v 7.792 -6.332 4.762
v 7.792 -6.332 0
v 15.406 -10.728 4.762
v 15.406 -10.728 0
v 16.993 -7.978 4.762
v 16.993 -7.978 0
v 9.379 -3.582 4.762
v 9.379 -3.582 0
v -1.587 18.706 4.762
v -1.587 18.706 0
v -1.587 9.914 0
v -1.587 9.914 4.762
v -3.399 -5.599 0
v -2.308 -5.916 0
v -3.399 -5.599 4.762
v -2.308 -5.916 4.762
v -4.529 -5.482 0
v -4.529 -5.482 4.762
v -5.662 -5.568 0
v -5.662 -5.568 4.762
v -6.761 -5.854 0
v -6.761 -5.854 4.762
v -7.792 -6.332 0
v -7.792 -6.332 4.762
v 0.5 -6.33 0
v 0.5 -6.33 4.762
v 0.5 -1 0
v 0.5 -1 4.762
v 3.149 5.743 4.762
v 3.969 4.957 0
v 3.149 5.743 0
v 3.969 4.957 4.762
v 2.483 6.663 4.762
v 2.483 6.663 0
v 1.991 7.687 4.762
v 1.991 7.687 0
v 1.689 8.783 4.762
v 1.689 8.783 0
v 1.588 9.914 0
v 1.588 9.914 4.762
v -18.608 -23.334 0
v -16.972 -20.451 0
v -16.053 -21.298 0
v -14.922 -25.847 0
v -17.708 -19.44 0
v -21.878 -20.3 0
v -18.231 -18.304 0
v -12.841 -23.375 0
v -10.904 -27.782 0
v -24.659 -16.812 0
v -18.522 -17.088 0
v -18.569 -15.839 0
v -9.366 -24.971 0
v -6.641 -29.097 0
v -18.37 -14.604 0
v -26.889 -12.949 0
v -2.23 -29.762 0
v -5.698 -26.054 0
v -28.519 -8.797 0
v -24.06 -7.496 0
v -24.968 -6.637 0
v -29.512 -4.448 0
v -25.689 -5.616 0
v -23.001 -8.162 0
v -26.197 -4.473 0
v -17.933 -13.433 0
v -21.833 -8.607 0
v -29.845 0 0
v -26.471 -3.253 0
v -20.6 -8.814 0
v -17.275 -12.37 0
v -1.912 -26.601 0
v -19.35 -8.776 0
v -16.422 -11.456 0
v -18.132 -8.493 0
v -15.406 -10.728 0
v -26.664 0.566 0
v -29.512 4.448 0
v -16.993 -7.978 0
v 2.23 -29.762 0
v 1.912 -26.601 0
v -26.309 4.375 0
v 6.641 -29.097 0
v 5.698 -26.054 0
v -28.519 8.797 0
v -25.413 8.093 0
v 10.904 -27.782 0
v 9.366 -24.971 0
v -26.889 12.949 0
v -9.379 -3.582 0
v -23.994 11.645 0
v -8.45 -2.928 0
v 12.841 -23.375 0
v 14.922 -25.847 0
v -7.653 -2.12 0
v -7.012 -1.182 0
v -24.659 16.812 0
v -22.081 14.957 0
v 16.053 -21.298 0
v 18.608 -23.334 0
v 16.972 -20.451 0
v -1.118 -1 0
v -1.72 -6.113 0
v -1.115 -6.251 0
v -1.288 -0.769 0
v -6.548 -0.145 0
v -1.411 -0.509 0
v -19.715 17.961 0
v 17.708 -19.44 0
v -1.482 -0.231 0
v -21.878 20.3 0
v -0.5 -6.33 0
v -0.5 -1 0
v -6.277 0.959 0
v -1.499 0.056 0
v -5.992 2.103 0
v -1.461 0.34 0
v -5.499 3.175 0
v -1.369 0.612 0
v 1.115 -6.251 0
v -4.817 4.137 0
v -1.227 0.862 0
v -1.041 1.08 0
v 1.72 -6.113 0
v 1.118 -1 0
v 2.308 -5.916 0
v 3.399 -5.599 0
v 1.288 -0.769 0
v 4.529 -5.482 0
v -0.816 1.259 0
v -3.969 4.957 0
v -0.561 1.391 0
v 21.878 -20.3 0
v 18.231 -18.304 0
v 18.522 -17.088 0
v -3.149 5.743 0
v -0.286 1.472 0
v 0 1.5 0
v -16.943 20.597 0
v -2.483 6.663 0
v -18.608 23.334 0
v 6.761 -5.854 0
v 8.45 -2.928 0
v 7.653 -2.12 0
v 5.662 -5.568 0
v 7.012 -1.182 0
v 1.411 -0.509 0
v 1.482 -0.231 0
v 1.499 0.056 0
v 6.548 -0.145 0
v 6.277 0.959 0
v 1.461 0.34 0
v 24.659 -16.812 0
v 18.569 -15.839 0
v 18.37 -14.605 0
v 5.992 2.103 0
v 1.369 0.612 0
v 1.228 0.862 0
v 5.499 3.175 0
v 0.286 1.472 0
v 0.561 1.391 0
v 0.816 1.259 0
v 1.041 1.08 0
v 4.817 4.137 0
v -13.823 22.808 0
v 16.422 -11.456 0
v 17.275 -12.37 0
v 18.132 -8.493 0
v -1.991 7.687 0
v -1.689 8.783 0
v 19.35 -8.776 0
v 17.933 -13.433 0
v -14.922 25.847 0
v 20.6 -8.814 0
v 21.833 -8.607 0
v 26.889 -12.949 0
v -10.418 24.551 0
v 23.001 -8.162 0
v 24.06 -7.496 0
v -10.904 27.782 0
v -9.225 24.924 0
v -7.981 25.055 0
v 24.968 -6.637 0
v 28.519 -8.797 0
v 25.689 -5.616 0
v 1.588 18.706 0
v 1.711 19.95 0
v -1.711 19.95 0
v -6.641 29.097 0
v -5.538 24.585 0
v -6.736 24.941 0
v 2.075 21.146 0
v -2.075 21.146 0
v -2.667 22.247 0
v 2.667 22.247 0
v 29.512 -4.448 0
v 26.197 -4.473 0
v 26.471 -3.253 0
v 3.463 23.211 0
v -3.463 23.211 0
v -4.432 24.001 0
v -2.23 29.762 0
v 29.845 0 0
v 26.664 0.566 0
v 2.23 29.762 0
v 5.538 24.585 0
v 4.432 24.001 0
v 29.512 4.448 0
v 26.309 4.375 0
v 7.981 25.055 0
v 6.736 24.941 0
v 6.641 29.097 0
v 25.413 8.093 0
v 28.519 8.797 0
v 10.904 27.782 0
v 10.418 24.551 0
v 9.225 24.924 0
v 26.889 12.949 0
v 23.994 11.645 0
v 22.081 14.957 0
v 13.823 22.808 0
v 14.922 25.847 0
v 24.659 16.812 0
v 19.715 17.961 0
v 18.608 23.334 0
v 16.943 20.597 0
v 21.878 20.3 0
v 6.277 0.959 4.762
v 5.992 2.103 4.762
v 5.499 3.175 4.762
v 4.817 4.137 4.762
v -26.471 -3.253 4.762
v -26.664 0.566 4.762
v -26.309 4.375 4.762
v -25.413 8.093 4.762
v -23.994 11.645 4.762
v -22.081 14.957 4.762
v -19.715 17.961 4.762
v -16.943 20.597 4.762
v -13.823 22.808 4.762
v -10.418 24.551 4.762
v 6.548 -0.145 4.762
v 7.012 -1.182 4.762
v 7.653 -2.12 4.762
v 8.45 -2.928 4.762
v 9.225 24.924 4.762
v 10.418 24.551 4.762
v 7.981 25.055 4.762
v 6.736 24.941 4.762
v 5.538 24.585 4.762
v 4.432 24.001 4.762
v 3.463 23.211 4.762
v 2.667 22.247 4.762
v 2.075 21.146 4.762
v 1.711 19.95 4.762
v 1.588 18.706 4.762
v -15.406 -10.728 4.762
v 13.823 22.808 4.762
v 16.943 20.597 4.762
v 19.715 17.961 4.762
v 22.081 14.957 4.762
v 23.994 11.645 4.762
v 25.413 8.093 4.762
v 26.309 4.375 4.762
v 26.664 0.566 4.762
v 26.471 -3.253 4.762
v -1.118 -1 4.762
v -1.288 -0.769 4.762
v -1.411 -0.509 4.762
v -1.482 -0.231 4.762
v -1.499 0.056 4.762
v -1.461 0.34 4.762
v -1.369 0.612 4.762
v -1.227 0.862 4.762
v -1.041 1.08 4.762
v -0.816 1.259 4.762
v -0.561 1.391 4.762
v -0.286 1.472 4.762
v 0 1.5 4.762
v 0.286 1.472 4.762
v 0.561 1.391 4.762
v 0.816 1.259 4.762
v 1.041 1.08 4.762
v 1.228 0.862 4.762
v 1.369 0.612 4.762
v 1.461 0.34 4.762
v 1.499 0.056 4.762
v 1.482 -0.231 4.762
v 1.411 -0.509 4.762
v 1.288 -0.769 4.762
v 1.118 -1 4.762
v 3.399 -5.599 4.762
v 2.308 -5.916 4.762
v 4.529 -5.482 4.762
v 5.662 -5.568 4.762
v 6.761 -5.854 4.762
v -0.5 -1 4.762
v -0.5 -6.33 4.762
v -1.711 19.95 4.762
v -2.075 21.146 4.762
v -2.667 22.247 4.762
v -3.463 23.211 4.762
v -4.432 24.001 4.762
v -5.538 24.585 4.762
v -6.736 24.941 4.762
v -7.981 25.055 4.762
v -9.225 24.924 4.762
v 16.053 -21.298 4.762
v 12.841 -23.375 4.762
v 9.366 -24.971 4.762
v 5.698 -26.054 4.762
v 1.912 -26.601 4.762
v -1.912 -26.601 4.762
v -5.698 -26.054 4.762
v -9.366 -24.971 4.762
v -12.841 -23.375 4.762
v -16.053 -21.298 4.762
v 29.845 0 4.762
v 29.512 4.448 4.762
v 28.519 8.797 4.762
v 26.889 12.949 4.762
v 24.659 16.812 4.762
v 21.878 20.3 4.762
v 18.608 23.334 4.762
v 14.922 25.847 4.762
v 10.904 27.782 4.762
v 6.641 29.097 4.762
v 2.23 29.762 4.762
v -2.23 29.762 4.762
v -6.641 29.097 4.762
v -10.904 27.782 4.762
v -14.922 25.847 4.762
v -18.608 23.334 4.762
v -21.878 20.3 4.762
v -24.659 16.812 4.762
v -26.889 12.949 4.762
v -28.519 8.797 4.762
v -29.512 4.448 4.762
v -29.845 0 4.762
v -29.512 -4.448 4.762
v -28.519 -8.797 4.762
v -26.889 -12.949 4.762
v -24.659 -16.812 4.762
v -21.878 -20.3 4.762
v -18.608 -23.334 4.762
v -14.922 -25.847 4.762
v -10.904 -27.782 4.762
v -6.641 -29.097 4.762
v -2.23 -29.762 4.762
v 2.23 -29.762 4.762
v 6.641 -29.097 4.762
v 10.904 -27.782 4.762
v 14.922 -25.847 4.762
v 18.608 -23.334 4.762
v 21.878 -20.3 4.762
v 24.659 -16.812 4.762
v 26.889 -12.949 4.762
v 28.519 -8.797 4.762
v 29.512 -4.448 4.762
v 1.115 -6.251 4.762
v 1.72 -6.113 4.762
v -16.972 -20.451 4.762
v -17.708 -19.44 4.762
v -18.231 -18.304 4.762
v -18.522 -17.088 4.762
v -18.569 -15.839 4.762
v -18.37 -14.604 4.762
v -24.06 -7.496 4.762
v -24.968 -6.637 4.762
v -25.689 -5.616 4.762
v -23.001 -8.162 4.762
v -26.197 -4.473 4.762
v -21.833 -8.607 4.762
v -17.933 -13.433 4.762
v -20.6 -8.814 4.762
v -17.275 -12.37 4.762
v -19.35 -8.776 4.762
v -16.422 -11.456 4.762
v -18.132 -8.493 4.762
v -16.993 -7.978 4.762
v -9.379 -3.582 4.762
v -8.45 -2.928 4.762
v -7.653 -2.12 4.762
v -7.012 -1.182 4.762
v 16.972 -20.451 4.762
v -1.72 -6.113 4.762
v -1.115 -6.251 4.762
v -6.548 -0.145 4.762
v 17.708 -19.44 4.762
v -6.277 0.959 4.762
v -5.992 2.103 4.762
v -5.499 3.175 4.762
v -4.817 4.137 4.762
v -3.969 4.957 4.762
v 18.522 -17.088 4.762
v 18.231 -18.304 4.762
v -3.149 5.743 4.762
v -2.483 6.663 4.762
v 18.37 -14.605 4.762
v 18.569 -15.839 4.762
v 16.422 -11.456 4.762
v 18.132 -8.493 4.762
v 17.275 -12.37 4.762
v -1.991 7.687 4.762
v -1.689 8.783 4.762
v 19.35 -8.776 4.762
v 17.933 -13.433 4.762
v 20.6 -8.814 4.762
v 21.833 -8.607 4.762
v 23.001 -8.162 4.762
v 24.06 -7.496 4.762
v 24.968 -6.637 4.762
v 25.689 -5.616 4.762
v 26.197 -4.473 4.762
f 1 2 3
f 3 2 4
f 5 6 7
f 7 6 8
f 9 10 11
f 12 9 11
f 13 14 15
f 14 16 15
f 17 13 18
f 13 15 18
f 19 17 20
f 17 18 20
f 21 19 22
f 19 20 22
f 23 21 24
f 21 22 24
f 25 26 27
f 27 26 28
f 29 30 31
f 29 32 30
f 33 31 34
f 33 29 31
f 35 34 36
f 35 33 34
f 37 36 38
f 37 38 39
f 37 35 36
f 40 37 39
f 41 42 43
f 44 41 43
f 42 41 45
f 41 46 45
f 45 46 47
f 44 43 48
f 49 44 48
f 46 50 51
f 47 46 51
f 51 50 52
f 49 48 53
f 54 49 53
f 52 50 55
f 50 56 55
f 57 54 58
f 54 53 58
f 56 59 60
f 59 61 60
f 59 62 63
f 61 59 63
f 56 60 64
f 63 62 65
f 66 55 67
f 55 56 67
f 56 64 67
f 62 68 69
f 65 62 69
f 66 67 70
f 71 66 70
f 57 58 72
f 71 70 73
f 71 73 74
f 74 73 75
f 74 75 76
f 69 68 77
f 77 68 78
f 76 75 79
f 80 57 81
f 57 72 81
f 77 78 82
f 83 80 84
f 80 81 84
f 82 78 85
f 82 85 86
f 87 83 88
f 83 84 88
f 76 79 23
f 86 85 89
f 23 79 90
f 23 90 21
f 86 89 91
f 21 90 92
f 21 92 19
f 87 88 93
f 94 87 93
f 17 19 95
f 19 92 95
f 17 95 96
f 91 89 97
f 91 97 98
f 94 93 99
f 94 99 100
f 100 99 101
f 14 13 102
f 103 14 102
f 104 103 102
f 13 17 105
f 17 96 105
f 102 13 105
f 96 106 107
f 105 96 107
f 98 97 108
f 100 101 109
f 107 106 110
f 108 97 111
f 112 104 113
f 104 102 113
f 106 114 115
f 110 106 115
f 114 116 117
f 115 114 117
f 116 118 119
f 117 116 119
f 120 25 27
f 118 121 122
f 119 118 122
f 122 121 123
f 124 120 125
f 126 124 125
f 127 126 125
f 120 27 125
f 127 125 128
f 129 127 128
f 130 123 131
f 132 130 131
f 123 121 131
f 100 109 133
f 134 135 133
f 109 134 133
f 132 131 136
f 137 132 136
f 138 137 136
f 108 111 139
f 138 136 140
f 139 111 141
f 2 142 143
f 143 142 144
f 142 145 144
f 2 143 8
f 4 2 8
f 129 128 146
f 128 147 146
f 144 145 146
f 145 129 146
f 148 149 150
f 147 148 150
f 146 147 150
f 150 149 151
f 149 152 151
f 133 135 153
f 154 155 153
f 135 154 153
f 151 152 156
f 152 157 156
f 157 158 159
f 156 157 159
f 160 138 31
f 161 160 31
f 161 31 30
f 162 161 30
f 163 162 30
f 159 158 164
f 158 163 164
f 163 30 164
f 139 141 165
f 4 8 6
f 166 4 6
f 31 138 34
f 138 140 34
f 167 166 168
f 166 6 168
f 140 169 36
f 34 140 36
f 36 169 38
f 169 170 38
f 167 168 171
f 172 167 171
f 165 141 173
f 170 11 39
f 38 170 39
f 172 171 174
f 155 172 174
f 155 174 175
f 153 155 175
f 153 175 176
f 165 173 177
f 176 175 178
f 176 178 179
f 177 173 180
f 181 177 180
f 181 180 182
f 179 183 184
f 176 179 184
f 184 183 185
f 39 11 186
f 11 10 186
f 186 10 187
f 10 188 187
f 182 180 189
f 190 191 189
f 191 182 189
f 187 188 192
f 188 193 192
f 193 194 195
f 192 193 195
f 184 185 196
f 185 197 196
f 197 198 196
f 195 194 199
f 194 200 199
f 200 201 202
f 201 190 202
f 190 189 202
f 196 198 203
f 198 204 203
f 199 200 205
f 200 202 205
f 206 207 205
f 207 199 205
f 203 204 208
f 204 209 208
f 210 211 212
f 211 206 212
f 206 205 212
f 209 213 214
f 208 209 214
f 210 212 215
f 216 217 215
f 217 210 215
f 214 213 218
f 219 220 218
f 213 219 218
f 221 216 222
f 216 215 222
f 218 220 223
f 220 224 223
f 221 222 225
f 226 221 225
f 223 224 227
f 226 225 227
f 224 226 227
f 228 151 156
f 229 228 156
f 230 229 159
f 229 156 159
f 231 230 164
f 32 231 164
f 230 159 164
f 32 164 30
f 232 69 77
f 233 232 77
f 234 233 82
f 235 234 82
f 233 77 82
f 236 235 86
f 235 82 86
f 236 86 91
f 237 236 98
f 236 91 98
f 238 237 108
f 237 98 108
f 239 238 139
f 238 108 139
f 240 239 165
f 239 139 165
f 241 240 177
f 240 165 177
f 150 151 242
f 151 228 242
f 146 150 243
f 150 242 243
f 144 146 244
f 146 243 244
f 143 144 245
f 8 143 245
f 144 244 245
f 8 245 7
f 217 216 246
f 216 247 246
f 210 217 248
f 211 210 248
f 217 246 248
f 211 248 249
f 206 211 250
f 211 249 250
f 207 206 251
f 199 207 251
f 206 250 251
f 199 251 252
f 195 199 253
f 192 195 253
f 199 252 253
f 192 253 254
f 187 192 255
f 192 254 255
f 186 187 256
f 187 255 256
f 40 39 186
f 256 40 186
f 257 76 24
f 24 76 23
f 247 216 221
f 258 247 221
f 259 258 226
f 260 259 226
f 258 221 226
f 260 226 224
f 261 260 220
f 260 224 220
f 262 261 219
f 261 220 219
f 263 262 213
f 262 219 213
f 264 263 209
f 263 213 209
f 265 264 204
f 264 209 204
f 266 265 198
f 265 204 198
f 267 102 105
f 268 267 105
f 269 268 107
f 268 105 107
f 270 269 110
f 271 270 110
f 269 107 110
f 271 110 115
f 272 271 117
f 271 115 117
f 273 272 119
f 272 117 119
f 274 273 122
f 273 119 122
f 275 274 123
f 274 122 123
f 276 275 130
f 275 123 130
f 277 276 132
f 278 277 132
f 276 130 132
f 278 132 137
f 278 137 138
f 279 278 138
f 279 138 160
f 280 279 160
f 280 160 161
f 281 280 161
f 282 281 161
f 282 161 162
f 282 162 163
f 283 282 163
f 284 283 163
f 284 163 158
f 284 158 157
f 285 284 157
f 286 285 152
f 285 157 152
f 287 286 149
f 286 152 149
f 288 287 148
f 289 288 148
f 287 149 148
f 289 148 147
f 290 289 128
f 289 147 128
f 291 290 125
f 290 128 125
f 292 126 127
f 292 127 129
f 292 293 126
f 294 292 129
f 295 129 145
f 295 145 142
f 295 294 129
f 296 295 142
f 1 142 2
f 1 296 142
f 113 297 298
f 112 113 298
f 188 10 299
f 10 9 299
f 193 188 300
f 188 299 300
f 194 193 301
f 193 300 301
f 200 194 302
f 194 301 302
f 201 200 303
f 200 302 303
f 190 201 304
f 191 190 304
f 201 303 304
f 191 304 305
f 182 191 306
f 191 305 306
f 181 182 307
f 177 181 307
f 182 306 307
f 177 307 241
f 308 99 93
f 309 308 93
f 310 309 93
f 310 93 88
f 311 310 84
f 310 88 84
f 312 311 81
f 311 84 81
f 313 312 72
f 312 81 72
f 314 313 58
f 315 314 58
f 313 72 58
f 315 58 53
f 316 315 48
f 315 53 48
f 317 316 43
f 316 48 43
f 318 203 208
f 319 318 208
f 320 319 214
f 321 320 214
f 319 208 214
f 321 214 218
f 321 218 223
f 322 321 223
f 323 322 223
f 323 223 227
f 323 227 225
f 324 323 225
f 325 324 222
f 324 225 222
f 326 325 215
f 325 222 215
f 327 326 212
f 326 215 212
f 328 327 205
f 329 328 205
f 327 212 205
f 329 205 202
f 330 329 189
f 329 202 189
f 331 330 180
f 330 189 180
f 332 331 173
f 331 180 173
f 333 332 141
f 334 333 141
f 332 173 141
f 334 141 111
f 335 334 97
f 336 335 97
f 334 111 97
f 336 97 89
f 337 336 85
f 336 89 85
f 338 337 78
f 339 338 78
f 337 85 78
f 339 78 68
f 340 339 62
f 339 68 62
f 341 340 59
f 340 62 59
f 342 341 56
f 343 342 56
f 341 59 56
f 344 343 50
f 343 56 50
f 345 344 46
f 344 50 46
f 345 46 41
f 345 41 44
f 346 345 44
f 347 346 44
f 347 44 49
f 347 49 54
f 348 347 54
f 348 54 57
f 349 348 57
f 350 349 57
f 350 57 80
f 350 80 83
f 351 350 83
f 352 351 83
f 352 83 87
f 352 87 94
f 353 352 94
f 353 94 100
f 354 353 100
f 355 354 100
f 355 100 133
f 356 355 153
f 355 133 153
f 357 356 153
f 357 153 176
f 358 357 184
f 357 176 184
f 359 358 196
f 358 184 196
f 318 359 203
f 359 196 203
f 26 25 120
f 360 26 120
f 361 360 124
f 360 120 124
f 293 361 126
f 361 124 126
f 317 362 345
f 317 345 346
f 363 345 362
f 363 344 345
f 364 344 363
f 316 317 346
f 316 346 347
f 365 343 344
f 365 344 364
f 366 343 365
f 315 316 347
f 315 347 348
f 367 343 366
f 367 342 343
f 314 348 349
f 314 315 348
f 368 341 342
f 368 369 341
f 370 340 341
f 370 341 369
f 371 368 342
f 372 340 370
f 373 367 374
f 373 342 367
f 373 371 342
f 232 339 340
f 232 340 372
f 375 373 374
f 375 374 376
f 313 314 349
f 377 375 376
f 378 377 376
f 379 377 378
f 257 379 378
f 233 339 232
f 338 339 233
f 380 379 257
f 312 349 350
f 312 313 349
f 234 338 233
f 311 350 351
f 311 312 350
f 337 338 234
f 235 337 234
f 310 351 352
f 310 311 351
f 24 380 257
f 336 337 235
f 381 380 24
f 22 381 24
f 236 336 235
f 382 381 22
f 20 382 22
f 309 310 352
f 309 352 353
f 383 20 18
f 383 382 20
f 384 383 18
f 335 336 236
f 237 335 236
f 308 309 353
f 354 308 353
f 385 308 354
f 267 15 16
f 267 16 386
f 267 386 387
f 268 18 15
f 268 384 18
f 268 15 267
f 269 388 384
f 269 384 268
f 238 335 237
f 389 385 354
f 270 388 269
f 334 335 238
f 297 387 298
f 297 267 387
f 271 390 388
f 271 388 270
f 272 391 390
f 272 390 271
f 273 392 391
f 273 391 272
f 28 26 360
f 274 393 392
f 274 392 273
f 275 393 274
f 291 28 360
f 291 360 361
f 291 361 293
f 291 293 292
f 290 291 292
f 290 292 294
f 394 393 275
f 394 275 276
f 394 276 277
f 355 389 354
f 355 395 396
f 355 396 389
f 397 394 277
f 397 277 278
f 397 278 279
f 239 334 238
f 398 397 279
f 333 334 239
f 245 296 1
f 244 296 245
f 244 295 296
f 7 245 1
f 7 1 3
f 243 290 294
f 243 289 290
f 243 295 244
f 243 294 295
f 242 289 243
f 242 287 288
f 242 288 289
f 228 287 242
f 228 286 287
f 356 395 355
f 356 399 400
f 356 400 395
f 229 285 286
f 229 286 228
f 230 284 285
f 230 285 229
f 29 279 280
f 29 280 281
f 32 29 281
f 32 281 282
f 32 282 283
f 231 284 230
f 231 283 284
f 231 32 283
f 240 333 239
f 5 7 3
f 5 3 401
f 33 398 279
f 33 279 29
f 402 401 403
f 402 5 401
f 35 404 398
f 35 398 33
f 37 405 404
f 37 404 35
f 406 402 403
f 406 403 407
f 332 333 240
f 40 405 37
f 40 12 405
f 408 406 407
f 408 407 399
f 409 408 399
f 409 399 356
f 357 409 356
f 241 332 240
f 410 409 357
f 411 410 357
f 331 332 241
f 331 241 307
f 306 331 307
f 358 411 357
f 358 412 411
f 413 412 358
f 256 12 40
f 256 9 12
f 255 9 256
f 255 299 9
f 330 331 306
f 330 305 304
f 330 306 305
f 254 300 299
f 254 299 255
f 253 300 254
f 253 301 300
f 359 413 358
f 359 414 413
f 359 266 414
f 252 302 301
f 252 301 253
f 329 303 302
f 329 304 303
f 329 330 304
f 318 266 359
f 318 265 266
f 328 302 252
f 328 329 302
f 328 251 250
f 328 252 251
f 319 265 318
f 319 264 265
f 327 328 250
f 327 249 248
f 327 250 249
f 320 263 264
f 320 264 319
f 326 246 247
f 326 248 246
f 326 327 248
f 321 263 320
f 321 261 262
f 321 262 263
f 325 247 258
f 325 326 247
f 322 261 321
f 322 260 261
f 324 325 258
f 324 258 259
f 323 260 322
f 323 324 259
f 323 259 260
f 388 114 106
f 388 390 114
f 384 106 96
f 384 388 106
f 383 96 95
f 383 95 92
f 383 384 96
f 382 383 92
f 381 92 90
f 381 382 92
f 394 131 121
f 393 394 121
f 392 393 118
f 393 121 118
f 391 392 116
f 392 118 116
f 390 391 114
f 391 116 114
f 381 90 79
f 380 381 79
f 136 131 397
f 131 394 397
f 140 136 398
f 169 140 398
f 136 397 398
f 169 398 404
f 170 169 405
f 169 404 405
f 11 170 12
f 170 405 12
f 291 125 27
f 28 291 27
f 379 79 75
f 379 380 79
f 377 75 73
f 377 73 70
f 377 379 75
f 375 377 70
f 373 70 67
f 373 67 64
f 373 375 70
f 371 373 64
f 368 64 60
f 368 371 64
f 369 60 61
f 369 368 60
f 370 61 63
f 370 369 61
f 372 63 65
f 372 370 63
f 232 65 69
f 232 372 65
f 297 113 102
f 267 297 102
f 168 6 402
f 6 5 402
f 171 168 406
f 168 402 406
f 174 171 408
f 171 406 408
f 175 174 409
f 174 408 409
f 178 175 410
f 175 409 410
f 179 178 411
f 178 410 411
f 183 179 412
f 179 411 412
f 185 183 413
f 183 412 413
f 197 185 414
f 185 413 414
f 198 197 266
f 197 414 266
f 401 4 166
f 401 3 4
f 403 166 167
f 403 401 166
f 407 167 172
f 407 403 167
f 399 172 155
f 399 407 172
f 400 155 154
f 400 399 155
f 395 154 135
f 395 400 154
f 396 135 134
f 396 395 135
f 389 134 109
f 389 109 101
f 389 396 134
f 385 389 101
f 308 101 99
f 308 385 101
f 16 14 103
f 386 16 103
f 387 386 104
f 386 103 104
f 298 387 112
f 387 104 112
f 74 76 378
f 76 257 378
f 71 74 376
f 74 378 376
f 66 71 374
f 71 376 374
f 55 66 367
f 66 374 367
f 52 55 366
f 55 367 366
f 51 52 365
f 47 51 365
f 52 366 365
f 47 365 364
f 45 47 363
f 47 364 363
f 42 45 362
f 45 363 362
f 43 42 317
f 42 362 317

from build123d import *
from OCP.BRepAlgoAPI import BRepAlgoAPI_Cut
from OCP.TopTools import TopTools_ListOfShape

# Parameters (mm, degrees)
BOSS_EXTRUDE1_OUTLINE_R = 29.845
BOSS_EXTRUDE1_DEPTH     = 4.7625
FILLET1_R               = 6.35
CUT_EXTRUDE1_DEPTH      = 43.475049227


with BuildPart() as part:
    # Boss-Extrude1: read off the stored shape, not the designer's step
    # Boss-Extrude1 outline → Boss-Extrude1 (new body)
    with BuildSketch(Plane.XY):
        with Locations((2.773e-06, -3.1e-06)):
            Circle(BOSS_EXTRUDE1_OUTLINE_R)
        with BuildLine():
            Line((4.530888578, -4.449000046), (22.26219582, -14.686175534))
            ThreePointArc((22.26219582, -14.686175534), (-1.522e-06, -26.6700031), (-22.262195004, -14.686168364))
            Line((-22.262195004, -14.686168364), (-4.530889051, -4.448993916))
            ThreePointArc((-4.530889051, -4.448993916), (-1.522e-06, -6.3500031), (4.530888578, -4.449000046))
        make_face(mode=Mode.SUBTRACT)
        with BuildLine():
            Line((-6.11838599, -1.699361492), (-23.849694433, -11.936537069))
            ThreePointArc((-23.849694433, -11.936537069), (-23.096893005, 13.334999916), (-1.587497227, 26.622707951))
            Line((-1.587497227, 26.622707951), (-1.587497227, 6.148357962))
            ThreePointArc((-1.587497227, 6.148357962), (-5.499256774, 3.174999961), (-6.11838599, -1.699361492))
        make_face(mode=Mode.SUBTRACT)
        with BuildLine():
            Line((1.118068907, -0.999933056), (-1.118065826, -0.9999303))
            ThreePointArc((-1.118065826, -0.9999303), (4.622e-06, 1.499974165), (1.118068907, -0.999933056))
        make_face(mode=Mode.SUBTRACT)
        with BuildLine():
            Line((1.587502773, 6.148357962), (1.587502773, 26.622707951))
            ThreePointArc((1.587502773, 26.622707951), (23.096900555, 13.334996444), (23.849696391, -11.936544238))
            Line((23.849696391, -11.936544238), (6.118389237, -1.69936977))
            ThreePointArc((6.118389237, -1.69936977), (5.499264467, 3.17499624), (1.587502773, 6.148357962))
        make_face(mode=Mode.SUBTRACT)
    extrude(amount=BOSS_EXTRUDE1_DEPTH)

    # Fillet1
    fillet1_edges = [part.edges().sort_by_distance(p)[0] for p in [
        (4.530888578, -4.449000046, 2.38125),
        (-4.530889051, -4.448993916, 2.38125),
        (-22.262195004, -14.686168364, 2.38125),
        (22.26219582, -14.686175534, 2.38125),
        (-23.849694433, -11.936537069, 2.38125),
        (-6.11838599, -1.699361492, 2.38125),
        (-1.587497227, 6.148357962, 2.38125),
        (-1.587497227, 26.622707951, 2.38125),
        (1.587502773, 26.622707951, 2.38125),
        (1.587502773, 6.148357962, 2.38125),
        (6.118389237, -1.69936977, 2.38125),
        (23.849696391, -11.936544238, 2.38125),
    ]]
    fillet(fillet1_edges, radius=FILLET1_R)


with BuildPart() as cut_extrude1_tool:
    # Sketch2 → Cut-Extrude1 (new, through all)
    with BuildSketch(Plane.XY.offset(4.7625)):
        with BuildLine():
            Line((0.500000016, -0.999931678), (0, -0.999931678))
            Line((0, -0.999931678), (0, -6.3500031))
            ThreePointArc((0, -6.3500031), (0.250194284, -6.345072384), (0.500000016, -6.330287672))
            Line((0.500000016, -6.330287672), (0.500000016, -0.999931678))
        make_face()
        with BuildLine():
            Line((0, -6.3500031), (0, -0.999931678))
            Line((0, -0.999931678), (-0.500000016, -0.999931678))
            Line((-0.500000016, -0.999931678), (-0.500000016, -6.330287234))
            ThreePointArc((-0.500000016, -6.330287234), (-0.250194288, -6.345072165), (0, -6.3500031))
        make_face()
    extrude(amount=-CUT_EXTRUDE1_DEPTH)


with BuildPart() as part_1:
    add(part.part)

    # Cut-Extrude1: cut by cut_extrude1_tool, with a tolerance
    cut_extrude1_stock = TopTools_ListOfShape()
    cut_extrude1_stock.Append(part_1.part.wrapped)
    cut_extrude1_tools = TopTools_ListOfShape()
    cut_extrude1_tools.Append(cut_extrude1_tool.part.wrapped)
    cut_extrude1_cut = BRepAlgoAPI_Cut()
    cut_extrude1_cut.SetArguments(cut_extrude1_stock)
    cut_extrude1_cut.SetTools(cut_extrude1_tools)
    cut_extrude1_cut.SetFuzzyValue(0.00001)
    cut_extrude1_cut.Build()
    add(Compound.cast(cut_extrude1_cut.Shape()).solids(), mode=Mode.REPLACE)


solid = part_1.part
